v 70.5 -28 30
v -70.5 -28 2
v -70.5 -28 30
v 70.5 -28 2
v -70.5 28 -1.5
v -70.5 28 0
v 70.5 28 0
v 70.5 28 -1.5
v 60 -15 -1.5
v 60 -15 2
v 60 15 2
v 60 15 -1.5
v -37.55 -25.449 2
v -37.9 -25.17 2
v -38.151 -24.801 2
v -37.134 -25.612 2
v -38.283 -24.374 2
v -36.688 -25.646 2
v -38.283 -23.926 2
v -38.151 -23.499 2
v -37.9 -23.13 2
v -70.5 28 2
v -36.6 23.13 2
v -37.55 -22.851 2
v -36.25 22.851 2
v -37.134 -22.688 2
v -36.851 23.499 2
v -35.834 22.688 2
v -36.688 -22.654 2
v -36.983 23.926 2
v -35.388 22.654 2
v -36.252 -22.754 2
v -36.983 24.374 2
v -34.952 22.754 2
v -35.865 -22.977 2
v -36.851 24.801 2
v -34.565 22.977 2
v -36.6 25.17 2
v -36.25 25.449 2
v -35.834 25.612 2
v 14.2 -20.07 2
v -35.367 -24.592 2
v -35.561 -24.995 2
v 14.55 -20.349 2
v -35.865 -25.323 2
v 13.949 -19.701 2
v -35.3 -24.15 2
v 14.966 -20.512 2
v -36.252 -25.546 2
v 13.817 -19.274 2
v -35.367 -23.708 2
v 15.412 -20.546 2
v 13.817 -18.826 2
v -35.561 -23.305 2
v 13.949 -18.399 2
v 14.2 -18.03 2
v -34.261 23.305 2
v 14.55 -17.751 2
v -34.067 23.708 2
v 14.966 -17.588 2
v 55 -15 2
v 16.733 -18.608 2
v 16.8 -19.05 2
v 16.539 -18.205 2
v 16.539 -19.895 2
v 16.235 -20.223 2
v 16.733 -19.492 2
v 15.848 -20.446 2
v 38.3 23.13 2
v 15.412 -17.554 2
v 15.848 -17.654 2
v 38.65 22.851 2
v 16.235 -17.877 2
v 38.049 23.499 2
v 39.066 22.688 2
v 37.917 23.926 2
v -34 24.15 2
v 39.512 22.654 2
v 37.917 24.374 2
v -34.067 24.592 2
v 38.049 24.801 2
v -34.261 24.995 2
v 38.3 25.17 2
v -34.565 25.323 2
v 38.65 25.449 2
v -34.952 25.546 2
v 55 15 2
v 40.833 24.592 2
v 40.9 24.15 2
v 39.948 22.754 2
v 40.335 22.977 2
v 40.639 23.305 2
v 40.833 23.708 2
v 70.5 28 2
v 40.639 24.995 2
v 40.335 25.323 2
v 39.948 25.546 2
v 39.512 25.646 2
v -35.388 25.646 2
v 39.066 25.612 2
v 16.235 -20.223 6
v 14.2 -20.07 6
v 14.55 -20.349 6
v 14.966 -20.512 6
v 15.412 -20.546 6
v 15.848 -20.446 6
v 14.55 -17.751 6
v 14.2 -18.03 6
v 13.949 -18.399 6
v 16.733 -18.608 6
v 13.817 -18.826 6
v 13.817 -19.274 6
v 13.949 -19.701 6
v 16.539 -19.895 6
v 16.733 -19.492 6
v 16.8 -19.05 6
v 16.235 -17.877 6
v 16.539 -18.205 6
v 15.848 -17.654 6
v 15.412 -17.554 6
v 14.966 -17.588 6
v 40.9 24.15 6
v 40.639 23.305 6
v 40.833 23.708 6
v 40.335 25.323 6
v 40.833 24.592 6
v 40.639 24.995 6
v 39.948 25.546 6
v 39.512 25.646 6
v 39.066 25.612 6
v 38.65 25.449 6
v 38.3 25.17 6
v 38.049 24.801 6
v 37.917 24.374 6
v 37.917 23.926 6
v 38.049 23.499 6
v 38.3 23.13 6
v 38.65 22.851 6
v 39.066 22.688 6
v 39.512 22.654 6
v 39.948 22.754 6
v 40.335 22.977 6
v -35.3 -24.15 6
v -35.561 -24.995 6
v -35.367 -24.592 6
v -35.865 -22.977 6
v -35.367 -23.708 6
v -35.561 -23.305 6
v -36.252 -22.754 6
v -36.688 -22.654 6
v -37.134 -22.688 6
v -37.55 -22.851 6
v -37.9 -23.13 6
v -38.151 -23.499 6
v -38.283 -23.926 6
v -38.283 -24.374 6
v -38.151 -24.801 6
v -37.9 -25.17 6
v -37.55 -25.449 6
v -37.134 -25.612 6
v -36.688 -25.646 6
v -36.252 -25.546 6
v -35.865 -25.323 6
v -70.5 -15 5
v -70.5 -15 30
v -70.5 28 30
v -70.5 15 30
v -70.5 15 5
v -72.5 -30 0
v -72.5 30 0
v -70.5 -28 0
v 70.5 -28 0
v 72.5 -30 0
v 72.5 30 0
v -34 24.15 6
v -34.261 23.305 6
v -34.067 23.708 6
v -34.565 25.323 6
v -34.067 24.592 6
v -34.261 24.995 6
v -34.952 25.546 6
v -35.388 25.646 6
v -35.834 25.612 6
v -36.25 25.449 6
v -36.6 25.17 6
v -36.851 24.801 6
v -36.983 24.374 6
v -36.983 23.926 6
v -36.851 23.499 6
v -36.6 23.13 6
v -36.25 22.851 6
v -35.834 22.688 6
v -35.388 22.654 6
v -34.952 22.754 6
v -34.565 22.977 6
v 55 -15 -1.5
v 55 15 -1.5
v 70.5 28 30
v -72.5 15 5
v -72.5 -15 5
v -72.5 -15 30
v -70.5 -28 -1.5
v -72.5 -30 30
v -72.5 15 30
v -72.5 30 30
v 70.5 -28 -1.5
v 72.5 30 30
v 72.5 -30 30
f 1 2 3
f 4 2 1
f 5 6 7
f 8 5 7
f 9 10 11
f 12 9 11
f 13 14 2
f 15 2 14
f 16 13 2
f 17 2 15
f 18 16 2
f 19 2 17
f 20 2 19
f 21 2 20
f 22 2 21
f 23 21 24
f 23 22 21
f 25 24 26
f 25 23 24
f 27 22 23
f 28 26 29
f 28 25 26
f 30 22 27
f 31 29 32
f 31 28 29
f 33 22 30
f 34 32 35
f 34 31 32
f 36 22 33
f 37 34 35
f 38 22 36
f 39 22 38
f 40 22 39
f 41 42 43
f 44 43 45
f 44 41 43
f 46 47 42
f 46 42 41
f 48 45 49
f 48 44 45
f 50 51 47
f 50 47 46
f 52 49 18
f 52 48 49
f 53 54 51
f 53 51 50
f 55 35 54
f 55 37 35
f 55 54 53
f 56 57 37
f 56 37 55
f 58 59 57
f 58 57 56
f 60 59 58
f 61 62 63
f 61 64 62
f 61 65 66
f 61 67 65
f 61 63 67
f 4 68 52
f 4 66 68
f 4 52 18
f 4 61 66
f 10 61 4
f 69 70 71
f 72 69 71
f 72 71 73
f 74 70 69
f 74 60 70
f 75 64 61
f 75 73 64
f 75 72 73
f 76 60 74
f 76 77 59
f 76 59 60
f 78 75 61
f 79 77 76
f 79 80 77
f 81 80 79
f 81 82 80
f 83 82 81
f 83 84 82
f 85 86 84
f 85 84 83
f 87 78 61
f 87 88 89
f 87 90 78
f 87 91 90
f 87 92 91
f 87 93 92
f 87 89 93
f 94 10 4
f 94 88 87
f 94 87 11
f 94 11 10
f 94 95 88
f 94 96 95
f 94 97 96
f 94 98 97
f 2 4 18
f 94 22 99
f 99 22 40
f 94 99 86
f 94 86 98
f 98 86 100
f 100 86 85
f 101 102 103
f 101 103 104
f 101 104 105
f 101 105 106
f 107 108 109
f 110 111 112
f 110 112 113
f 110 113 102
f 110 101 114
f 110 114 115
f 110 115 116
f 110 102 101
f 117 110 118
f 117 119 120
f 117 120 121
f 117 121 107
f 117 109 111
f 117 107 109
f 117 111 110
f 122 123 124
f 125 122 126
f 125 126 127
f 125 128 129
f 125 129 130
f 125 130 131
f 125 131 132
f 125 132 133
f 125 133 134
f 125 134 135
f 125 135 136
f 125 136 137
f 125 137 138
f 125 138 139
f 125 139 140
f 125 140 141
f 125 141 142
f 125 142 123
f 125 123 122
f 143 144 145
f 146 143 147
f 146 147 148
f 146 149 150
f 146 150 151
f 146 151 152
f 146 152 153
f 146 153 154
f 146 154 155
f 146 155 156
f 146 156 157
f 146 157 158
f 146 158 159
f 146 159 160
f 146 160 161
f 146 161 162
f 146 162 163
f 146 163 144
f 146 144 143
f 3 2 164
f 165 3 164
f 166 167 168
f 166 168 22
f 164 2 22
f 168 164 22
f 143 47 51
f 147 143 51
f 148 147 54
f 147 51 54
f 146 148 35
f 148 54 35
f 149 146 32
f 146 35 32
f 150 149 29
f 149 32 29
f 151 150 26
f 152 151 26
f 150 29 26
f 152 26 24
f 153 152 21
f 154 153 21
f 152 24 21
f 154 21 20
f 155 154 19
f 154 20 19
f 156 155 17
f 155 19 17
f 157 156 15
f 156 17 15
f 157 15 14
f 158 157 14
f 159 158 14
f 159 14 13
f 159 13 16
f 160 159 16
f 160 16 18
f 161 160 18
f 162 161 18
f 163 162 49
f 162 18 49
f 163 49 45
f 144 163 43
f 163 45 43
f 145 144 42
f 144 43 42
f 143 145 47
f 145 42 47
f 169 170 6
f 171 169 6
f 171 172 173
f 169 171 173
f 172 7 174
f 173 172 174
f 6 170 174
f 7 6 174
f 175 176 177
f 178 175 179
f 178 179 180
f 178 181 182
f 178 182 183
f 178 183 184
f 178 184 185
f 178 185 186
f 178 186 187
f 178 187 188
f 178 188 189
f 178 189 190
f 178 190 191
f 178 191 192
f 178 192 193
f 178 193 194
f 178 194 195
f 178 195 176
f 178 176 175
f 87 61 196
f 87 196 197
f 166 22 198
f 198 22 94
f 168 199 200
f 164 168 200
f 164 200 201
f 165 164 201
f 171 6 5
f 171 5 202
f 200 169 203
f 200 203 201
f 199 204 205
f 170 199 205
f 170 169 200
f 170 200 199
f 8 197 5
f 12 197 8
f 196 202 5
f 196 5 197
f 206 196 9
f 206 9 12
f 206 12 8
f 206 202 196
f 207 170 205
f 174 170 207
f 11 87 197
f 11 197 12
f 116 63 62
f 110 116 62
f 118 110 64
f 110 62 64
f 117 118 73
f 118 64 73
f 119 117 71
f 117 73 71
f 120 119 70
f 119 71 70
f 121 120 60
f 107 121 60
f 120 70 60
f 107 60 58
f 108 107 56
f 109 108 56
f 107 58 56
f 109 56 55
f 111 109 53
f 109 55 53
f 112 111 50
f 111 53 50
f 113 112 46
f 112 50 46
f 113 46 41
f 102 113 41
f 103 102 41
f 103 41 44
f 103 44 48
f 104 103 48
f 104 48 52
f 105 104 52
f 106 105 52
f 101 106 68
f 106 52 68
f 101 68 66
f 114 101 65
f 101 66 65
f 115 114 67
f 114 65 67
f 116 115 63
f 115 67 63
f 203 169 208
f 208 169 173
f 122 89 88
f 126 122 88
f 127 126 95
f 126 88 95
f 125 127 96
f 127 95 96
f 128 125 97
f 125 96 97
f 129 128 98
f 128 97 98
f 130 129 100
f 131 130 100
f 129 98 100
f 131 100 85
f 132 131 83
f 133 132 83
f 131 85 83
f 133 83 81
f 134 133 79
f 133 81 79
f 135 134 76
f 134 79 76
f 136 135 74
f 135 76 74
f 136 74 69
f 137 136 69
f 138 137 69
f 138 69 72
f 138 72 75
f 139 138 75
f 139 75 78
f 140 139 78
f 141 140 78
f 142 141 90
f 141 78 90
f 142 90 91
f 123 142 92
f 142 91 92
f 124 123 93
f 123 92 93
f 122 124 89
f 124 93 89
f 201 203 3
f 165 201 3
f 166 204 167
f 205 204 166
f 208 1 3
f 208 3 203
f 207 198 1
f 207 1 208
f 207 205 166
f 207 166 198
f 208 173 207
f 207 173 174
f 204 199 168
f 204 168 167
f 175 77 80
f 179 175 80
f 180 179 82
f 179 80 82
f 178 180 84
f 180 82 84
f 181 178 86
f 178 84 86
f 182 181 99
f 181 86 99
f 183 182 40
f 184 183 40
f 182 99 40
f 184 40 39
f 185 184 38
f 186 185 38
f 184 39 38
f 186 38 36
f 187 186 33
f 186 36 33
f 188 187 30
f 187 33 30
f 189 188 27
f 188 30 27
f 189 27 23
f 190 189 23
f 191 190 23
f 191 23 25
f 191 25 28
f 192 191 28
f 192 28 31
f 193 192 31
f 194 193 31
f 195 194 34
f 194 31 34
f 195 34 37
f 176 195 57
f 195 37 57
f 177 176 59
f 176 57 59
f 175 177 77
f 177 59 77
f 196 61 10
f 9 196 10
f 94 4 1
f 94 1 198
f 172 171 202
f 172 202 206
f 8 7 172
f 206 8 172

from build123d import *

# Parameters (mm, degrees)
SKETCH_W        = 145
SKETCH_H        = 60
PAD_DEPTH       = 30
THICKNESS_T     = -2
SKETCH001_W     = 141
SKETCH001_H     = 56
PAD001_DEPTH    = 1.5
SKETCH002_W     = 30
SKETCH002_H     = 25
POCKET_DEPTH    = 2
SKETCH003_W     = 5
SKETCH003_H     = 30
POCKET001_DEPTH = 3.5
SKETCH004_R     = 1.5
PAD002_DEPTH    = 4


with BuildPart() as part:
    # Sketch → Pad (new body)
    with BuildSketch(Plane.XY):
        Rectangle(SKETCH_W, SKETCH_H)
    extrude(amount=PAD_DEPTH)

    # Thickness
    thickness_openings = [part.faces().sort_by_distance(p)[0] for p in [
        (0, 0, 30),
    ]]
    offset(amount=THICKNESS_T, openings=thickness_openings, kind=Kind.INTERSECTION)

    # Sketch001 (on Face5 of Thickness) → Pad001 (join)
    with BuildSketch(Plane(origin=(0, 0, 0), x_dir=(1, 0, 0), z_dir=(0, 0, -1))):
        Rectangle(SKETCH001_W, SKETCH001_H)
    extrude(amount=PAD001_DEPTH)

    # Sketch002 (on Face2 of Pad001) → Pocket (cut)
    with BuildSketch(Plane(origin=(-72.5, 0, 0), x_dir=(0, -1, 0), z_dir=(-1, 0, 0))):
        with Locations((0, 17.5)):
            Rectangle(SKETCH002_W, SKETCH002_H)
    extrude(amount=-POCKET_DEPTH, mode=Mode.SUBTRACT)

    # Sketch003 (on Face19 of Pocket) → Pocket001 (cut)
    with BuildSketch(Plane.XY.offset(2)):
        with Locations((57.5, 0)):
            Rectangle(SKETCH003_W, SKETCH003_H)
    extrude(amount=-POCKET001_DEPTH, mode=Mode.SUBTRACT)

    # Sketch004 (on Face19 of Pocket001) → Pad002 (join)
    with BuildSketch(Plane.XY.offset(2)):
        with Locations((-35.5, 24.15)):
            Circle(SKETCH004_R)
        with Locations((-36.8, -24.15)):
            Circle(SKETCH004_R)
        with Locations((39.4, 24.15)):
            Circle(SKETCH004_R)
        with Locations((15.3, -19.05)):
            Circle(SKETCH004_R)
    extrude(amount=PAD002_DEPTH)


solid = part.part
